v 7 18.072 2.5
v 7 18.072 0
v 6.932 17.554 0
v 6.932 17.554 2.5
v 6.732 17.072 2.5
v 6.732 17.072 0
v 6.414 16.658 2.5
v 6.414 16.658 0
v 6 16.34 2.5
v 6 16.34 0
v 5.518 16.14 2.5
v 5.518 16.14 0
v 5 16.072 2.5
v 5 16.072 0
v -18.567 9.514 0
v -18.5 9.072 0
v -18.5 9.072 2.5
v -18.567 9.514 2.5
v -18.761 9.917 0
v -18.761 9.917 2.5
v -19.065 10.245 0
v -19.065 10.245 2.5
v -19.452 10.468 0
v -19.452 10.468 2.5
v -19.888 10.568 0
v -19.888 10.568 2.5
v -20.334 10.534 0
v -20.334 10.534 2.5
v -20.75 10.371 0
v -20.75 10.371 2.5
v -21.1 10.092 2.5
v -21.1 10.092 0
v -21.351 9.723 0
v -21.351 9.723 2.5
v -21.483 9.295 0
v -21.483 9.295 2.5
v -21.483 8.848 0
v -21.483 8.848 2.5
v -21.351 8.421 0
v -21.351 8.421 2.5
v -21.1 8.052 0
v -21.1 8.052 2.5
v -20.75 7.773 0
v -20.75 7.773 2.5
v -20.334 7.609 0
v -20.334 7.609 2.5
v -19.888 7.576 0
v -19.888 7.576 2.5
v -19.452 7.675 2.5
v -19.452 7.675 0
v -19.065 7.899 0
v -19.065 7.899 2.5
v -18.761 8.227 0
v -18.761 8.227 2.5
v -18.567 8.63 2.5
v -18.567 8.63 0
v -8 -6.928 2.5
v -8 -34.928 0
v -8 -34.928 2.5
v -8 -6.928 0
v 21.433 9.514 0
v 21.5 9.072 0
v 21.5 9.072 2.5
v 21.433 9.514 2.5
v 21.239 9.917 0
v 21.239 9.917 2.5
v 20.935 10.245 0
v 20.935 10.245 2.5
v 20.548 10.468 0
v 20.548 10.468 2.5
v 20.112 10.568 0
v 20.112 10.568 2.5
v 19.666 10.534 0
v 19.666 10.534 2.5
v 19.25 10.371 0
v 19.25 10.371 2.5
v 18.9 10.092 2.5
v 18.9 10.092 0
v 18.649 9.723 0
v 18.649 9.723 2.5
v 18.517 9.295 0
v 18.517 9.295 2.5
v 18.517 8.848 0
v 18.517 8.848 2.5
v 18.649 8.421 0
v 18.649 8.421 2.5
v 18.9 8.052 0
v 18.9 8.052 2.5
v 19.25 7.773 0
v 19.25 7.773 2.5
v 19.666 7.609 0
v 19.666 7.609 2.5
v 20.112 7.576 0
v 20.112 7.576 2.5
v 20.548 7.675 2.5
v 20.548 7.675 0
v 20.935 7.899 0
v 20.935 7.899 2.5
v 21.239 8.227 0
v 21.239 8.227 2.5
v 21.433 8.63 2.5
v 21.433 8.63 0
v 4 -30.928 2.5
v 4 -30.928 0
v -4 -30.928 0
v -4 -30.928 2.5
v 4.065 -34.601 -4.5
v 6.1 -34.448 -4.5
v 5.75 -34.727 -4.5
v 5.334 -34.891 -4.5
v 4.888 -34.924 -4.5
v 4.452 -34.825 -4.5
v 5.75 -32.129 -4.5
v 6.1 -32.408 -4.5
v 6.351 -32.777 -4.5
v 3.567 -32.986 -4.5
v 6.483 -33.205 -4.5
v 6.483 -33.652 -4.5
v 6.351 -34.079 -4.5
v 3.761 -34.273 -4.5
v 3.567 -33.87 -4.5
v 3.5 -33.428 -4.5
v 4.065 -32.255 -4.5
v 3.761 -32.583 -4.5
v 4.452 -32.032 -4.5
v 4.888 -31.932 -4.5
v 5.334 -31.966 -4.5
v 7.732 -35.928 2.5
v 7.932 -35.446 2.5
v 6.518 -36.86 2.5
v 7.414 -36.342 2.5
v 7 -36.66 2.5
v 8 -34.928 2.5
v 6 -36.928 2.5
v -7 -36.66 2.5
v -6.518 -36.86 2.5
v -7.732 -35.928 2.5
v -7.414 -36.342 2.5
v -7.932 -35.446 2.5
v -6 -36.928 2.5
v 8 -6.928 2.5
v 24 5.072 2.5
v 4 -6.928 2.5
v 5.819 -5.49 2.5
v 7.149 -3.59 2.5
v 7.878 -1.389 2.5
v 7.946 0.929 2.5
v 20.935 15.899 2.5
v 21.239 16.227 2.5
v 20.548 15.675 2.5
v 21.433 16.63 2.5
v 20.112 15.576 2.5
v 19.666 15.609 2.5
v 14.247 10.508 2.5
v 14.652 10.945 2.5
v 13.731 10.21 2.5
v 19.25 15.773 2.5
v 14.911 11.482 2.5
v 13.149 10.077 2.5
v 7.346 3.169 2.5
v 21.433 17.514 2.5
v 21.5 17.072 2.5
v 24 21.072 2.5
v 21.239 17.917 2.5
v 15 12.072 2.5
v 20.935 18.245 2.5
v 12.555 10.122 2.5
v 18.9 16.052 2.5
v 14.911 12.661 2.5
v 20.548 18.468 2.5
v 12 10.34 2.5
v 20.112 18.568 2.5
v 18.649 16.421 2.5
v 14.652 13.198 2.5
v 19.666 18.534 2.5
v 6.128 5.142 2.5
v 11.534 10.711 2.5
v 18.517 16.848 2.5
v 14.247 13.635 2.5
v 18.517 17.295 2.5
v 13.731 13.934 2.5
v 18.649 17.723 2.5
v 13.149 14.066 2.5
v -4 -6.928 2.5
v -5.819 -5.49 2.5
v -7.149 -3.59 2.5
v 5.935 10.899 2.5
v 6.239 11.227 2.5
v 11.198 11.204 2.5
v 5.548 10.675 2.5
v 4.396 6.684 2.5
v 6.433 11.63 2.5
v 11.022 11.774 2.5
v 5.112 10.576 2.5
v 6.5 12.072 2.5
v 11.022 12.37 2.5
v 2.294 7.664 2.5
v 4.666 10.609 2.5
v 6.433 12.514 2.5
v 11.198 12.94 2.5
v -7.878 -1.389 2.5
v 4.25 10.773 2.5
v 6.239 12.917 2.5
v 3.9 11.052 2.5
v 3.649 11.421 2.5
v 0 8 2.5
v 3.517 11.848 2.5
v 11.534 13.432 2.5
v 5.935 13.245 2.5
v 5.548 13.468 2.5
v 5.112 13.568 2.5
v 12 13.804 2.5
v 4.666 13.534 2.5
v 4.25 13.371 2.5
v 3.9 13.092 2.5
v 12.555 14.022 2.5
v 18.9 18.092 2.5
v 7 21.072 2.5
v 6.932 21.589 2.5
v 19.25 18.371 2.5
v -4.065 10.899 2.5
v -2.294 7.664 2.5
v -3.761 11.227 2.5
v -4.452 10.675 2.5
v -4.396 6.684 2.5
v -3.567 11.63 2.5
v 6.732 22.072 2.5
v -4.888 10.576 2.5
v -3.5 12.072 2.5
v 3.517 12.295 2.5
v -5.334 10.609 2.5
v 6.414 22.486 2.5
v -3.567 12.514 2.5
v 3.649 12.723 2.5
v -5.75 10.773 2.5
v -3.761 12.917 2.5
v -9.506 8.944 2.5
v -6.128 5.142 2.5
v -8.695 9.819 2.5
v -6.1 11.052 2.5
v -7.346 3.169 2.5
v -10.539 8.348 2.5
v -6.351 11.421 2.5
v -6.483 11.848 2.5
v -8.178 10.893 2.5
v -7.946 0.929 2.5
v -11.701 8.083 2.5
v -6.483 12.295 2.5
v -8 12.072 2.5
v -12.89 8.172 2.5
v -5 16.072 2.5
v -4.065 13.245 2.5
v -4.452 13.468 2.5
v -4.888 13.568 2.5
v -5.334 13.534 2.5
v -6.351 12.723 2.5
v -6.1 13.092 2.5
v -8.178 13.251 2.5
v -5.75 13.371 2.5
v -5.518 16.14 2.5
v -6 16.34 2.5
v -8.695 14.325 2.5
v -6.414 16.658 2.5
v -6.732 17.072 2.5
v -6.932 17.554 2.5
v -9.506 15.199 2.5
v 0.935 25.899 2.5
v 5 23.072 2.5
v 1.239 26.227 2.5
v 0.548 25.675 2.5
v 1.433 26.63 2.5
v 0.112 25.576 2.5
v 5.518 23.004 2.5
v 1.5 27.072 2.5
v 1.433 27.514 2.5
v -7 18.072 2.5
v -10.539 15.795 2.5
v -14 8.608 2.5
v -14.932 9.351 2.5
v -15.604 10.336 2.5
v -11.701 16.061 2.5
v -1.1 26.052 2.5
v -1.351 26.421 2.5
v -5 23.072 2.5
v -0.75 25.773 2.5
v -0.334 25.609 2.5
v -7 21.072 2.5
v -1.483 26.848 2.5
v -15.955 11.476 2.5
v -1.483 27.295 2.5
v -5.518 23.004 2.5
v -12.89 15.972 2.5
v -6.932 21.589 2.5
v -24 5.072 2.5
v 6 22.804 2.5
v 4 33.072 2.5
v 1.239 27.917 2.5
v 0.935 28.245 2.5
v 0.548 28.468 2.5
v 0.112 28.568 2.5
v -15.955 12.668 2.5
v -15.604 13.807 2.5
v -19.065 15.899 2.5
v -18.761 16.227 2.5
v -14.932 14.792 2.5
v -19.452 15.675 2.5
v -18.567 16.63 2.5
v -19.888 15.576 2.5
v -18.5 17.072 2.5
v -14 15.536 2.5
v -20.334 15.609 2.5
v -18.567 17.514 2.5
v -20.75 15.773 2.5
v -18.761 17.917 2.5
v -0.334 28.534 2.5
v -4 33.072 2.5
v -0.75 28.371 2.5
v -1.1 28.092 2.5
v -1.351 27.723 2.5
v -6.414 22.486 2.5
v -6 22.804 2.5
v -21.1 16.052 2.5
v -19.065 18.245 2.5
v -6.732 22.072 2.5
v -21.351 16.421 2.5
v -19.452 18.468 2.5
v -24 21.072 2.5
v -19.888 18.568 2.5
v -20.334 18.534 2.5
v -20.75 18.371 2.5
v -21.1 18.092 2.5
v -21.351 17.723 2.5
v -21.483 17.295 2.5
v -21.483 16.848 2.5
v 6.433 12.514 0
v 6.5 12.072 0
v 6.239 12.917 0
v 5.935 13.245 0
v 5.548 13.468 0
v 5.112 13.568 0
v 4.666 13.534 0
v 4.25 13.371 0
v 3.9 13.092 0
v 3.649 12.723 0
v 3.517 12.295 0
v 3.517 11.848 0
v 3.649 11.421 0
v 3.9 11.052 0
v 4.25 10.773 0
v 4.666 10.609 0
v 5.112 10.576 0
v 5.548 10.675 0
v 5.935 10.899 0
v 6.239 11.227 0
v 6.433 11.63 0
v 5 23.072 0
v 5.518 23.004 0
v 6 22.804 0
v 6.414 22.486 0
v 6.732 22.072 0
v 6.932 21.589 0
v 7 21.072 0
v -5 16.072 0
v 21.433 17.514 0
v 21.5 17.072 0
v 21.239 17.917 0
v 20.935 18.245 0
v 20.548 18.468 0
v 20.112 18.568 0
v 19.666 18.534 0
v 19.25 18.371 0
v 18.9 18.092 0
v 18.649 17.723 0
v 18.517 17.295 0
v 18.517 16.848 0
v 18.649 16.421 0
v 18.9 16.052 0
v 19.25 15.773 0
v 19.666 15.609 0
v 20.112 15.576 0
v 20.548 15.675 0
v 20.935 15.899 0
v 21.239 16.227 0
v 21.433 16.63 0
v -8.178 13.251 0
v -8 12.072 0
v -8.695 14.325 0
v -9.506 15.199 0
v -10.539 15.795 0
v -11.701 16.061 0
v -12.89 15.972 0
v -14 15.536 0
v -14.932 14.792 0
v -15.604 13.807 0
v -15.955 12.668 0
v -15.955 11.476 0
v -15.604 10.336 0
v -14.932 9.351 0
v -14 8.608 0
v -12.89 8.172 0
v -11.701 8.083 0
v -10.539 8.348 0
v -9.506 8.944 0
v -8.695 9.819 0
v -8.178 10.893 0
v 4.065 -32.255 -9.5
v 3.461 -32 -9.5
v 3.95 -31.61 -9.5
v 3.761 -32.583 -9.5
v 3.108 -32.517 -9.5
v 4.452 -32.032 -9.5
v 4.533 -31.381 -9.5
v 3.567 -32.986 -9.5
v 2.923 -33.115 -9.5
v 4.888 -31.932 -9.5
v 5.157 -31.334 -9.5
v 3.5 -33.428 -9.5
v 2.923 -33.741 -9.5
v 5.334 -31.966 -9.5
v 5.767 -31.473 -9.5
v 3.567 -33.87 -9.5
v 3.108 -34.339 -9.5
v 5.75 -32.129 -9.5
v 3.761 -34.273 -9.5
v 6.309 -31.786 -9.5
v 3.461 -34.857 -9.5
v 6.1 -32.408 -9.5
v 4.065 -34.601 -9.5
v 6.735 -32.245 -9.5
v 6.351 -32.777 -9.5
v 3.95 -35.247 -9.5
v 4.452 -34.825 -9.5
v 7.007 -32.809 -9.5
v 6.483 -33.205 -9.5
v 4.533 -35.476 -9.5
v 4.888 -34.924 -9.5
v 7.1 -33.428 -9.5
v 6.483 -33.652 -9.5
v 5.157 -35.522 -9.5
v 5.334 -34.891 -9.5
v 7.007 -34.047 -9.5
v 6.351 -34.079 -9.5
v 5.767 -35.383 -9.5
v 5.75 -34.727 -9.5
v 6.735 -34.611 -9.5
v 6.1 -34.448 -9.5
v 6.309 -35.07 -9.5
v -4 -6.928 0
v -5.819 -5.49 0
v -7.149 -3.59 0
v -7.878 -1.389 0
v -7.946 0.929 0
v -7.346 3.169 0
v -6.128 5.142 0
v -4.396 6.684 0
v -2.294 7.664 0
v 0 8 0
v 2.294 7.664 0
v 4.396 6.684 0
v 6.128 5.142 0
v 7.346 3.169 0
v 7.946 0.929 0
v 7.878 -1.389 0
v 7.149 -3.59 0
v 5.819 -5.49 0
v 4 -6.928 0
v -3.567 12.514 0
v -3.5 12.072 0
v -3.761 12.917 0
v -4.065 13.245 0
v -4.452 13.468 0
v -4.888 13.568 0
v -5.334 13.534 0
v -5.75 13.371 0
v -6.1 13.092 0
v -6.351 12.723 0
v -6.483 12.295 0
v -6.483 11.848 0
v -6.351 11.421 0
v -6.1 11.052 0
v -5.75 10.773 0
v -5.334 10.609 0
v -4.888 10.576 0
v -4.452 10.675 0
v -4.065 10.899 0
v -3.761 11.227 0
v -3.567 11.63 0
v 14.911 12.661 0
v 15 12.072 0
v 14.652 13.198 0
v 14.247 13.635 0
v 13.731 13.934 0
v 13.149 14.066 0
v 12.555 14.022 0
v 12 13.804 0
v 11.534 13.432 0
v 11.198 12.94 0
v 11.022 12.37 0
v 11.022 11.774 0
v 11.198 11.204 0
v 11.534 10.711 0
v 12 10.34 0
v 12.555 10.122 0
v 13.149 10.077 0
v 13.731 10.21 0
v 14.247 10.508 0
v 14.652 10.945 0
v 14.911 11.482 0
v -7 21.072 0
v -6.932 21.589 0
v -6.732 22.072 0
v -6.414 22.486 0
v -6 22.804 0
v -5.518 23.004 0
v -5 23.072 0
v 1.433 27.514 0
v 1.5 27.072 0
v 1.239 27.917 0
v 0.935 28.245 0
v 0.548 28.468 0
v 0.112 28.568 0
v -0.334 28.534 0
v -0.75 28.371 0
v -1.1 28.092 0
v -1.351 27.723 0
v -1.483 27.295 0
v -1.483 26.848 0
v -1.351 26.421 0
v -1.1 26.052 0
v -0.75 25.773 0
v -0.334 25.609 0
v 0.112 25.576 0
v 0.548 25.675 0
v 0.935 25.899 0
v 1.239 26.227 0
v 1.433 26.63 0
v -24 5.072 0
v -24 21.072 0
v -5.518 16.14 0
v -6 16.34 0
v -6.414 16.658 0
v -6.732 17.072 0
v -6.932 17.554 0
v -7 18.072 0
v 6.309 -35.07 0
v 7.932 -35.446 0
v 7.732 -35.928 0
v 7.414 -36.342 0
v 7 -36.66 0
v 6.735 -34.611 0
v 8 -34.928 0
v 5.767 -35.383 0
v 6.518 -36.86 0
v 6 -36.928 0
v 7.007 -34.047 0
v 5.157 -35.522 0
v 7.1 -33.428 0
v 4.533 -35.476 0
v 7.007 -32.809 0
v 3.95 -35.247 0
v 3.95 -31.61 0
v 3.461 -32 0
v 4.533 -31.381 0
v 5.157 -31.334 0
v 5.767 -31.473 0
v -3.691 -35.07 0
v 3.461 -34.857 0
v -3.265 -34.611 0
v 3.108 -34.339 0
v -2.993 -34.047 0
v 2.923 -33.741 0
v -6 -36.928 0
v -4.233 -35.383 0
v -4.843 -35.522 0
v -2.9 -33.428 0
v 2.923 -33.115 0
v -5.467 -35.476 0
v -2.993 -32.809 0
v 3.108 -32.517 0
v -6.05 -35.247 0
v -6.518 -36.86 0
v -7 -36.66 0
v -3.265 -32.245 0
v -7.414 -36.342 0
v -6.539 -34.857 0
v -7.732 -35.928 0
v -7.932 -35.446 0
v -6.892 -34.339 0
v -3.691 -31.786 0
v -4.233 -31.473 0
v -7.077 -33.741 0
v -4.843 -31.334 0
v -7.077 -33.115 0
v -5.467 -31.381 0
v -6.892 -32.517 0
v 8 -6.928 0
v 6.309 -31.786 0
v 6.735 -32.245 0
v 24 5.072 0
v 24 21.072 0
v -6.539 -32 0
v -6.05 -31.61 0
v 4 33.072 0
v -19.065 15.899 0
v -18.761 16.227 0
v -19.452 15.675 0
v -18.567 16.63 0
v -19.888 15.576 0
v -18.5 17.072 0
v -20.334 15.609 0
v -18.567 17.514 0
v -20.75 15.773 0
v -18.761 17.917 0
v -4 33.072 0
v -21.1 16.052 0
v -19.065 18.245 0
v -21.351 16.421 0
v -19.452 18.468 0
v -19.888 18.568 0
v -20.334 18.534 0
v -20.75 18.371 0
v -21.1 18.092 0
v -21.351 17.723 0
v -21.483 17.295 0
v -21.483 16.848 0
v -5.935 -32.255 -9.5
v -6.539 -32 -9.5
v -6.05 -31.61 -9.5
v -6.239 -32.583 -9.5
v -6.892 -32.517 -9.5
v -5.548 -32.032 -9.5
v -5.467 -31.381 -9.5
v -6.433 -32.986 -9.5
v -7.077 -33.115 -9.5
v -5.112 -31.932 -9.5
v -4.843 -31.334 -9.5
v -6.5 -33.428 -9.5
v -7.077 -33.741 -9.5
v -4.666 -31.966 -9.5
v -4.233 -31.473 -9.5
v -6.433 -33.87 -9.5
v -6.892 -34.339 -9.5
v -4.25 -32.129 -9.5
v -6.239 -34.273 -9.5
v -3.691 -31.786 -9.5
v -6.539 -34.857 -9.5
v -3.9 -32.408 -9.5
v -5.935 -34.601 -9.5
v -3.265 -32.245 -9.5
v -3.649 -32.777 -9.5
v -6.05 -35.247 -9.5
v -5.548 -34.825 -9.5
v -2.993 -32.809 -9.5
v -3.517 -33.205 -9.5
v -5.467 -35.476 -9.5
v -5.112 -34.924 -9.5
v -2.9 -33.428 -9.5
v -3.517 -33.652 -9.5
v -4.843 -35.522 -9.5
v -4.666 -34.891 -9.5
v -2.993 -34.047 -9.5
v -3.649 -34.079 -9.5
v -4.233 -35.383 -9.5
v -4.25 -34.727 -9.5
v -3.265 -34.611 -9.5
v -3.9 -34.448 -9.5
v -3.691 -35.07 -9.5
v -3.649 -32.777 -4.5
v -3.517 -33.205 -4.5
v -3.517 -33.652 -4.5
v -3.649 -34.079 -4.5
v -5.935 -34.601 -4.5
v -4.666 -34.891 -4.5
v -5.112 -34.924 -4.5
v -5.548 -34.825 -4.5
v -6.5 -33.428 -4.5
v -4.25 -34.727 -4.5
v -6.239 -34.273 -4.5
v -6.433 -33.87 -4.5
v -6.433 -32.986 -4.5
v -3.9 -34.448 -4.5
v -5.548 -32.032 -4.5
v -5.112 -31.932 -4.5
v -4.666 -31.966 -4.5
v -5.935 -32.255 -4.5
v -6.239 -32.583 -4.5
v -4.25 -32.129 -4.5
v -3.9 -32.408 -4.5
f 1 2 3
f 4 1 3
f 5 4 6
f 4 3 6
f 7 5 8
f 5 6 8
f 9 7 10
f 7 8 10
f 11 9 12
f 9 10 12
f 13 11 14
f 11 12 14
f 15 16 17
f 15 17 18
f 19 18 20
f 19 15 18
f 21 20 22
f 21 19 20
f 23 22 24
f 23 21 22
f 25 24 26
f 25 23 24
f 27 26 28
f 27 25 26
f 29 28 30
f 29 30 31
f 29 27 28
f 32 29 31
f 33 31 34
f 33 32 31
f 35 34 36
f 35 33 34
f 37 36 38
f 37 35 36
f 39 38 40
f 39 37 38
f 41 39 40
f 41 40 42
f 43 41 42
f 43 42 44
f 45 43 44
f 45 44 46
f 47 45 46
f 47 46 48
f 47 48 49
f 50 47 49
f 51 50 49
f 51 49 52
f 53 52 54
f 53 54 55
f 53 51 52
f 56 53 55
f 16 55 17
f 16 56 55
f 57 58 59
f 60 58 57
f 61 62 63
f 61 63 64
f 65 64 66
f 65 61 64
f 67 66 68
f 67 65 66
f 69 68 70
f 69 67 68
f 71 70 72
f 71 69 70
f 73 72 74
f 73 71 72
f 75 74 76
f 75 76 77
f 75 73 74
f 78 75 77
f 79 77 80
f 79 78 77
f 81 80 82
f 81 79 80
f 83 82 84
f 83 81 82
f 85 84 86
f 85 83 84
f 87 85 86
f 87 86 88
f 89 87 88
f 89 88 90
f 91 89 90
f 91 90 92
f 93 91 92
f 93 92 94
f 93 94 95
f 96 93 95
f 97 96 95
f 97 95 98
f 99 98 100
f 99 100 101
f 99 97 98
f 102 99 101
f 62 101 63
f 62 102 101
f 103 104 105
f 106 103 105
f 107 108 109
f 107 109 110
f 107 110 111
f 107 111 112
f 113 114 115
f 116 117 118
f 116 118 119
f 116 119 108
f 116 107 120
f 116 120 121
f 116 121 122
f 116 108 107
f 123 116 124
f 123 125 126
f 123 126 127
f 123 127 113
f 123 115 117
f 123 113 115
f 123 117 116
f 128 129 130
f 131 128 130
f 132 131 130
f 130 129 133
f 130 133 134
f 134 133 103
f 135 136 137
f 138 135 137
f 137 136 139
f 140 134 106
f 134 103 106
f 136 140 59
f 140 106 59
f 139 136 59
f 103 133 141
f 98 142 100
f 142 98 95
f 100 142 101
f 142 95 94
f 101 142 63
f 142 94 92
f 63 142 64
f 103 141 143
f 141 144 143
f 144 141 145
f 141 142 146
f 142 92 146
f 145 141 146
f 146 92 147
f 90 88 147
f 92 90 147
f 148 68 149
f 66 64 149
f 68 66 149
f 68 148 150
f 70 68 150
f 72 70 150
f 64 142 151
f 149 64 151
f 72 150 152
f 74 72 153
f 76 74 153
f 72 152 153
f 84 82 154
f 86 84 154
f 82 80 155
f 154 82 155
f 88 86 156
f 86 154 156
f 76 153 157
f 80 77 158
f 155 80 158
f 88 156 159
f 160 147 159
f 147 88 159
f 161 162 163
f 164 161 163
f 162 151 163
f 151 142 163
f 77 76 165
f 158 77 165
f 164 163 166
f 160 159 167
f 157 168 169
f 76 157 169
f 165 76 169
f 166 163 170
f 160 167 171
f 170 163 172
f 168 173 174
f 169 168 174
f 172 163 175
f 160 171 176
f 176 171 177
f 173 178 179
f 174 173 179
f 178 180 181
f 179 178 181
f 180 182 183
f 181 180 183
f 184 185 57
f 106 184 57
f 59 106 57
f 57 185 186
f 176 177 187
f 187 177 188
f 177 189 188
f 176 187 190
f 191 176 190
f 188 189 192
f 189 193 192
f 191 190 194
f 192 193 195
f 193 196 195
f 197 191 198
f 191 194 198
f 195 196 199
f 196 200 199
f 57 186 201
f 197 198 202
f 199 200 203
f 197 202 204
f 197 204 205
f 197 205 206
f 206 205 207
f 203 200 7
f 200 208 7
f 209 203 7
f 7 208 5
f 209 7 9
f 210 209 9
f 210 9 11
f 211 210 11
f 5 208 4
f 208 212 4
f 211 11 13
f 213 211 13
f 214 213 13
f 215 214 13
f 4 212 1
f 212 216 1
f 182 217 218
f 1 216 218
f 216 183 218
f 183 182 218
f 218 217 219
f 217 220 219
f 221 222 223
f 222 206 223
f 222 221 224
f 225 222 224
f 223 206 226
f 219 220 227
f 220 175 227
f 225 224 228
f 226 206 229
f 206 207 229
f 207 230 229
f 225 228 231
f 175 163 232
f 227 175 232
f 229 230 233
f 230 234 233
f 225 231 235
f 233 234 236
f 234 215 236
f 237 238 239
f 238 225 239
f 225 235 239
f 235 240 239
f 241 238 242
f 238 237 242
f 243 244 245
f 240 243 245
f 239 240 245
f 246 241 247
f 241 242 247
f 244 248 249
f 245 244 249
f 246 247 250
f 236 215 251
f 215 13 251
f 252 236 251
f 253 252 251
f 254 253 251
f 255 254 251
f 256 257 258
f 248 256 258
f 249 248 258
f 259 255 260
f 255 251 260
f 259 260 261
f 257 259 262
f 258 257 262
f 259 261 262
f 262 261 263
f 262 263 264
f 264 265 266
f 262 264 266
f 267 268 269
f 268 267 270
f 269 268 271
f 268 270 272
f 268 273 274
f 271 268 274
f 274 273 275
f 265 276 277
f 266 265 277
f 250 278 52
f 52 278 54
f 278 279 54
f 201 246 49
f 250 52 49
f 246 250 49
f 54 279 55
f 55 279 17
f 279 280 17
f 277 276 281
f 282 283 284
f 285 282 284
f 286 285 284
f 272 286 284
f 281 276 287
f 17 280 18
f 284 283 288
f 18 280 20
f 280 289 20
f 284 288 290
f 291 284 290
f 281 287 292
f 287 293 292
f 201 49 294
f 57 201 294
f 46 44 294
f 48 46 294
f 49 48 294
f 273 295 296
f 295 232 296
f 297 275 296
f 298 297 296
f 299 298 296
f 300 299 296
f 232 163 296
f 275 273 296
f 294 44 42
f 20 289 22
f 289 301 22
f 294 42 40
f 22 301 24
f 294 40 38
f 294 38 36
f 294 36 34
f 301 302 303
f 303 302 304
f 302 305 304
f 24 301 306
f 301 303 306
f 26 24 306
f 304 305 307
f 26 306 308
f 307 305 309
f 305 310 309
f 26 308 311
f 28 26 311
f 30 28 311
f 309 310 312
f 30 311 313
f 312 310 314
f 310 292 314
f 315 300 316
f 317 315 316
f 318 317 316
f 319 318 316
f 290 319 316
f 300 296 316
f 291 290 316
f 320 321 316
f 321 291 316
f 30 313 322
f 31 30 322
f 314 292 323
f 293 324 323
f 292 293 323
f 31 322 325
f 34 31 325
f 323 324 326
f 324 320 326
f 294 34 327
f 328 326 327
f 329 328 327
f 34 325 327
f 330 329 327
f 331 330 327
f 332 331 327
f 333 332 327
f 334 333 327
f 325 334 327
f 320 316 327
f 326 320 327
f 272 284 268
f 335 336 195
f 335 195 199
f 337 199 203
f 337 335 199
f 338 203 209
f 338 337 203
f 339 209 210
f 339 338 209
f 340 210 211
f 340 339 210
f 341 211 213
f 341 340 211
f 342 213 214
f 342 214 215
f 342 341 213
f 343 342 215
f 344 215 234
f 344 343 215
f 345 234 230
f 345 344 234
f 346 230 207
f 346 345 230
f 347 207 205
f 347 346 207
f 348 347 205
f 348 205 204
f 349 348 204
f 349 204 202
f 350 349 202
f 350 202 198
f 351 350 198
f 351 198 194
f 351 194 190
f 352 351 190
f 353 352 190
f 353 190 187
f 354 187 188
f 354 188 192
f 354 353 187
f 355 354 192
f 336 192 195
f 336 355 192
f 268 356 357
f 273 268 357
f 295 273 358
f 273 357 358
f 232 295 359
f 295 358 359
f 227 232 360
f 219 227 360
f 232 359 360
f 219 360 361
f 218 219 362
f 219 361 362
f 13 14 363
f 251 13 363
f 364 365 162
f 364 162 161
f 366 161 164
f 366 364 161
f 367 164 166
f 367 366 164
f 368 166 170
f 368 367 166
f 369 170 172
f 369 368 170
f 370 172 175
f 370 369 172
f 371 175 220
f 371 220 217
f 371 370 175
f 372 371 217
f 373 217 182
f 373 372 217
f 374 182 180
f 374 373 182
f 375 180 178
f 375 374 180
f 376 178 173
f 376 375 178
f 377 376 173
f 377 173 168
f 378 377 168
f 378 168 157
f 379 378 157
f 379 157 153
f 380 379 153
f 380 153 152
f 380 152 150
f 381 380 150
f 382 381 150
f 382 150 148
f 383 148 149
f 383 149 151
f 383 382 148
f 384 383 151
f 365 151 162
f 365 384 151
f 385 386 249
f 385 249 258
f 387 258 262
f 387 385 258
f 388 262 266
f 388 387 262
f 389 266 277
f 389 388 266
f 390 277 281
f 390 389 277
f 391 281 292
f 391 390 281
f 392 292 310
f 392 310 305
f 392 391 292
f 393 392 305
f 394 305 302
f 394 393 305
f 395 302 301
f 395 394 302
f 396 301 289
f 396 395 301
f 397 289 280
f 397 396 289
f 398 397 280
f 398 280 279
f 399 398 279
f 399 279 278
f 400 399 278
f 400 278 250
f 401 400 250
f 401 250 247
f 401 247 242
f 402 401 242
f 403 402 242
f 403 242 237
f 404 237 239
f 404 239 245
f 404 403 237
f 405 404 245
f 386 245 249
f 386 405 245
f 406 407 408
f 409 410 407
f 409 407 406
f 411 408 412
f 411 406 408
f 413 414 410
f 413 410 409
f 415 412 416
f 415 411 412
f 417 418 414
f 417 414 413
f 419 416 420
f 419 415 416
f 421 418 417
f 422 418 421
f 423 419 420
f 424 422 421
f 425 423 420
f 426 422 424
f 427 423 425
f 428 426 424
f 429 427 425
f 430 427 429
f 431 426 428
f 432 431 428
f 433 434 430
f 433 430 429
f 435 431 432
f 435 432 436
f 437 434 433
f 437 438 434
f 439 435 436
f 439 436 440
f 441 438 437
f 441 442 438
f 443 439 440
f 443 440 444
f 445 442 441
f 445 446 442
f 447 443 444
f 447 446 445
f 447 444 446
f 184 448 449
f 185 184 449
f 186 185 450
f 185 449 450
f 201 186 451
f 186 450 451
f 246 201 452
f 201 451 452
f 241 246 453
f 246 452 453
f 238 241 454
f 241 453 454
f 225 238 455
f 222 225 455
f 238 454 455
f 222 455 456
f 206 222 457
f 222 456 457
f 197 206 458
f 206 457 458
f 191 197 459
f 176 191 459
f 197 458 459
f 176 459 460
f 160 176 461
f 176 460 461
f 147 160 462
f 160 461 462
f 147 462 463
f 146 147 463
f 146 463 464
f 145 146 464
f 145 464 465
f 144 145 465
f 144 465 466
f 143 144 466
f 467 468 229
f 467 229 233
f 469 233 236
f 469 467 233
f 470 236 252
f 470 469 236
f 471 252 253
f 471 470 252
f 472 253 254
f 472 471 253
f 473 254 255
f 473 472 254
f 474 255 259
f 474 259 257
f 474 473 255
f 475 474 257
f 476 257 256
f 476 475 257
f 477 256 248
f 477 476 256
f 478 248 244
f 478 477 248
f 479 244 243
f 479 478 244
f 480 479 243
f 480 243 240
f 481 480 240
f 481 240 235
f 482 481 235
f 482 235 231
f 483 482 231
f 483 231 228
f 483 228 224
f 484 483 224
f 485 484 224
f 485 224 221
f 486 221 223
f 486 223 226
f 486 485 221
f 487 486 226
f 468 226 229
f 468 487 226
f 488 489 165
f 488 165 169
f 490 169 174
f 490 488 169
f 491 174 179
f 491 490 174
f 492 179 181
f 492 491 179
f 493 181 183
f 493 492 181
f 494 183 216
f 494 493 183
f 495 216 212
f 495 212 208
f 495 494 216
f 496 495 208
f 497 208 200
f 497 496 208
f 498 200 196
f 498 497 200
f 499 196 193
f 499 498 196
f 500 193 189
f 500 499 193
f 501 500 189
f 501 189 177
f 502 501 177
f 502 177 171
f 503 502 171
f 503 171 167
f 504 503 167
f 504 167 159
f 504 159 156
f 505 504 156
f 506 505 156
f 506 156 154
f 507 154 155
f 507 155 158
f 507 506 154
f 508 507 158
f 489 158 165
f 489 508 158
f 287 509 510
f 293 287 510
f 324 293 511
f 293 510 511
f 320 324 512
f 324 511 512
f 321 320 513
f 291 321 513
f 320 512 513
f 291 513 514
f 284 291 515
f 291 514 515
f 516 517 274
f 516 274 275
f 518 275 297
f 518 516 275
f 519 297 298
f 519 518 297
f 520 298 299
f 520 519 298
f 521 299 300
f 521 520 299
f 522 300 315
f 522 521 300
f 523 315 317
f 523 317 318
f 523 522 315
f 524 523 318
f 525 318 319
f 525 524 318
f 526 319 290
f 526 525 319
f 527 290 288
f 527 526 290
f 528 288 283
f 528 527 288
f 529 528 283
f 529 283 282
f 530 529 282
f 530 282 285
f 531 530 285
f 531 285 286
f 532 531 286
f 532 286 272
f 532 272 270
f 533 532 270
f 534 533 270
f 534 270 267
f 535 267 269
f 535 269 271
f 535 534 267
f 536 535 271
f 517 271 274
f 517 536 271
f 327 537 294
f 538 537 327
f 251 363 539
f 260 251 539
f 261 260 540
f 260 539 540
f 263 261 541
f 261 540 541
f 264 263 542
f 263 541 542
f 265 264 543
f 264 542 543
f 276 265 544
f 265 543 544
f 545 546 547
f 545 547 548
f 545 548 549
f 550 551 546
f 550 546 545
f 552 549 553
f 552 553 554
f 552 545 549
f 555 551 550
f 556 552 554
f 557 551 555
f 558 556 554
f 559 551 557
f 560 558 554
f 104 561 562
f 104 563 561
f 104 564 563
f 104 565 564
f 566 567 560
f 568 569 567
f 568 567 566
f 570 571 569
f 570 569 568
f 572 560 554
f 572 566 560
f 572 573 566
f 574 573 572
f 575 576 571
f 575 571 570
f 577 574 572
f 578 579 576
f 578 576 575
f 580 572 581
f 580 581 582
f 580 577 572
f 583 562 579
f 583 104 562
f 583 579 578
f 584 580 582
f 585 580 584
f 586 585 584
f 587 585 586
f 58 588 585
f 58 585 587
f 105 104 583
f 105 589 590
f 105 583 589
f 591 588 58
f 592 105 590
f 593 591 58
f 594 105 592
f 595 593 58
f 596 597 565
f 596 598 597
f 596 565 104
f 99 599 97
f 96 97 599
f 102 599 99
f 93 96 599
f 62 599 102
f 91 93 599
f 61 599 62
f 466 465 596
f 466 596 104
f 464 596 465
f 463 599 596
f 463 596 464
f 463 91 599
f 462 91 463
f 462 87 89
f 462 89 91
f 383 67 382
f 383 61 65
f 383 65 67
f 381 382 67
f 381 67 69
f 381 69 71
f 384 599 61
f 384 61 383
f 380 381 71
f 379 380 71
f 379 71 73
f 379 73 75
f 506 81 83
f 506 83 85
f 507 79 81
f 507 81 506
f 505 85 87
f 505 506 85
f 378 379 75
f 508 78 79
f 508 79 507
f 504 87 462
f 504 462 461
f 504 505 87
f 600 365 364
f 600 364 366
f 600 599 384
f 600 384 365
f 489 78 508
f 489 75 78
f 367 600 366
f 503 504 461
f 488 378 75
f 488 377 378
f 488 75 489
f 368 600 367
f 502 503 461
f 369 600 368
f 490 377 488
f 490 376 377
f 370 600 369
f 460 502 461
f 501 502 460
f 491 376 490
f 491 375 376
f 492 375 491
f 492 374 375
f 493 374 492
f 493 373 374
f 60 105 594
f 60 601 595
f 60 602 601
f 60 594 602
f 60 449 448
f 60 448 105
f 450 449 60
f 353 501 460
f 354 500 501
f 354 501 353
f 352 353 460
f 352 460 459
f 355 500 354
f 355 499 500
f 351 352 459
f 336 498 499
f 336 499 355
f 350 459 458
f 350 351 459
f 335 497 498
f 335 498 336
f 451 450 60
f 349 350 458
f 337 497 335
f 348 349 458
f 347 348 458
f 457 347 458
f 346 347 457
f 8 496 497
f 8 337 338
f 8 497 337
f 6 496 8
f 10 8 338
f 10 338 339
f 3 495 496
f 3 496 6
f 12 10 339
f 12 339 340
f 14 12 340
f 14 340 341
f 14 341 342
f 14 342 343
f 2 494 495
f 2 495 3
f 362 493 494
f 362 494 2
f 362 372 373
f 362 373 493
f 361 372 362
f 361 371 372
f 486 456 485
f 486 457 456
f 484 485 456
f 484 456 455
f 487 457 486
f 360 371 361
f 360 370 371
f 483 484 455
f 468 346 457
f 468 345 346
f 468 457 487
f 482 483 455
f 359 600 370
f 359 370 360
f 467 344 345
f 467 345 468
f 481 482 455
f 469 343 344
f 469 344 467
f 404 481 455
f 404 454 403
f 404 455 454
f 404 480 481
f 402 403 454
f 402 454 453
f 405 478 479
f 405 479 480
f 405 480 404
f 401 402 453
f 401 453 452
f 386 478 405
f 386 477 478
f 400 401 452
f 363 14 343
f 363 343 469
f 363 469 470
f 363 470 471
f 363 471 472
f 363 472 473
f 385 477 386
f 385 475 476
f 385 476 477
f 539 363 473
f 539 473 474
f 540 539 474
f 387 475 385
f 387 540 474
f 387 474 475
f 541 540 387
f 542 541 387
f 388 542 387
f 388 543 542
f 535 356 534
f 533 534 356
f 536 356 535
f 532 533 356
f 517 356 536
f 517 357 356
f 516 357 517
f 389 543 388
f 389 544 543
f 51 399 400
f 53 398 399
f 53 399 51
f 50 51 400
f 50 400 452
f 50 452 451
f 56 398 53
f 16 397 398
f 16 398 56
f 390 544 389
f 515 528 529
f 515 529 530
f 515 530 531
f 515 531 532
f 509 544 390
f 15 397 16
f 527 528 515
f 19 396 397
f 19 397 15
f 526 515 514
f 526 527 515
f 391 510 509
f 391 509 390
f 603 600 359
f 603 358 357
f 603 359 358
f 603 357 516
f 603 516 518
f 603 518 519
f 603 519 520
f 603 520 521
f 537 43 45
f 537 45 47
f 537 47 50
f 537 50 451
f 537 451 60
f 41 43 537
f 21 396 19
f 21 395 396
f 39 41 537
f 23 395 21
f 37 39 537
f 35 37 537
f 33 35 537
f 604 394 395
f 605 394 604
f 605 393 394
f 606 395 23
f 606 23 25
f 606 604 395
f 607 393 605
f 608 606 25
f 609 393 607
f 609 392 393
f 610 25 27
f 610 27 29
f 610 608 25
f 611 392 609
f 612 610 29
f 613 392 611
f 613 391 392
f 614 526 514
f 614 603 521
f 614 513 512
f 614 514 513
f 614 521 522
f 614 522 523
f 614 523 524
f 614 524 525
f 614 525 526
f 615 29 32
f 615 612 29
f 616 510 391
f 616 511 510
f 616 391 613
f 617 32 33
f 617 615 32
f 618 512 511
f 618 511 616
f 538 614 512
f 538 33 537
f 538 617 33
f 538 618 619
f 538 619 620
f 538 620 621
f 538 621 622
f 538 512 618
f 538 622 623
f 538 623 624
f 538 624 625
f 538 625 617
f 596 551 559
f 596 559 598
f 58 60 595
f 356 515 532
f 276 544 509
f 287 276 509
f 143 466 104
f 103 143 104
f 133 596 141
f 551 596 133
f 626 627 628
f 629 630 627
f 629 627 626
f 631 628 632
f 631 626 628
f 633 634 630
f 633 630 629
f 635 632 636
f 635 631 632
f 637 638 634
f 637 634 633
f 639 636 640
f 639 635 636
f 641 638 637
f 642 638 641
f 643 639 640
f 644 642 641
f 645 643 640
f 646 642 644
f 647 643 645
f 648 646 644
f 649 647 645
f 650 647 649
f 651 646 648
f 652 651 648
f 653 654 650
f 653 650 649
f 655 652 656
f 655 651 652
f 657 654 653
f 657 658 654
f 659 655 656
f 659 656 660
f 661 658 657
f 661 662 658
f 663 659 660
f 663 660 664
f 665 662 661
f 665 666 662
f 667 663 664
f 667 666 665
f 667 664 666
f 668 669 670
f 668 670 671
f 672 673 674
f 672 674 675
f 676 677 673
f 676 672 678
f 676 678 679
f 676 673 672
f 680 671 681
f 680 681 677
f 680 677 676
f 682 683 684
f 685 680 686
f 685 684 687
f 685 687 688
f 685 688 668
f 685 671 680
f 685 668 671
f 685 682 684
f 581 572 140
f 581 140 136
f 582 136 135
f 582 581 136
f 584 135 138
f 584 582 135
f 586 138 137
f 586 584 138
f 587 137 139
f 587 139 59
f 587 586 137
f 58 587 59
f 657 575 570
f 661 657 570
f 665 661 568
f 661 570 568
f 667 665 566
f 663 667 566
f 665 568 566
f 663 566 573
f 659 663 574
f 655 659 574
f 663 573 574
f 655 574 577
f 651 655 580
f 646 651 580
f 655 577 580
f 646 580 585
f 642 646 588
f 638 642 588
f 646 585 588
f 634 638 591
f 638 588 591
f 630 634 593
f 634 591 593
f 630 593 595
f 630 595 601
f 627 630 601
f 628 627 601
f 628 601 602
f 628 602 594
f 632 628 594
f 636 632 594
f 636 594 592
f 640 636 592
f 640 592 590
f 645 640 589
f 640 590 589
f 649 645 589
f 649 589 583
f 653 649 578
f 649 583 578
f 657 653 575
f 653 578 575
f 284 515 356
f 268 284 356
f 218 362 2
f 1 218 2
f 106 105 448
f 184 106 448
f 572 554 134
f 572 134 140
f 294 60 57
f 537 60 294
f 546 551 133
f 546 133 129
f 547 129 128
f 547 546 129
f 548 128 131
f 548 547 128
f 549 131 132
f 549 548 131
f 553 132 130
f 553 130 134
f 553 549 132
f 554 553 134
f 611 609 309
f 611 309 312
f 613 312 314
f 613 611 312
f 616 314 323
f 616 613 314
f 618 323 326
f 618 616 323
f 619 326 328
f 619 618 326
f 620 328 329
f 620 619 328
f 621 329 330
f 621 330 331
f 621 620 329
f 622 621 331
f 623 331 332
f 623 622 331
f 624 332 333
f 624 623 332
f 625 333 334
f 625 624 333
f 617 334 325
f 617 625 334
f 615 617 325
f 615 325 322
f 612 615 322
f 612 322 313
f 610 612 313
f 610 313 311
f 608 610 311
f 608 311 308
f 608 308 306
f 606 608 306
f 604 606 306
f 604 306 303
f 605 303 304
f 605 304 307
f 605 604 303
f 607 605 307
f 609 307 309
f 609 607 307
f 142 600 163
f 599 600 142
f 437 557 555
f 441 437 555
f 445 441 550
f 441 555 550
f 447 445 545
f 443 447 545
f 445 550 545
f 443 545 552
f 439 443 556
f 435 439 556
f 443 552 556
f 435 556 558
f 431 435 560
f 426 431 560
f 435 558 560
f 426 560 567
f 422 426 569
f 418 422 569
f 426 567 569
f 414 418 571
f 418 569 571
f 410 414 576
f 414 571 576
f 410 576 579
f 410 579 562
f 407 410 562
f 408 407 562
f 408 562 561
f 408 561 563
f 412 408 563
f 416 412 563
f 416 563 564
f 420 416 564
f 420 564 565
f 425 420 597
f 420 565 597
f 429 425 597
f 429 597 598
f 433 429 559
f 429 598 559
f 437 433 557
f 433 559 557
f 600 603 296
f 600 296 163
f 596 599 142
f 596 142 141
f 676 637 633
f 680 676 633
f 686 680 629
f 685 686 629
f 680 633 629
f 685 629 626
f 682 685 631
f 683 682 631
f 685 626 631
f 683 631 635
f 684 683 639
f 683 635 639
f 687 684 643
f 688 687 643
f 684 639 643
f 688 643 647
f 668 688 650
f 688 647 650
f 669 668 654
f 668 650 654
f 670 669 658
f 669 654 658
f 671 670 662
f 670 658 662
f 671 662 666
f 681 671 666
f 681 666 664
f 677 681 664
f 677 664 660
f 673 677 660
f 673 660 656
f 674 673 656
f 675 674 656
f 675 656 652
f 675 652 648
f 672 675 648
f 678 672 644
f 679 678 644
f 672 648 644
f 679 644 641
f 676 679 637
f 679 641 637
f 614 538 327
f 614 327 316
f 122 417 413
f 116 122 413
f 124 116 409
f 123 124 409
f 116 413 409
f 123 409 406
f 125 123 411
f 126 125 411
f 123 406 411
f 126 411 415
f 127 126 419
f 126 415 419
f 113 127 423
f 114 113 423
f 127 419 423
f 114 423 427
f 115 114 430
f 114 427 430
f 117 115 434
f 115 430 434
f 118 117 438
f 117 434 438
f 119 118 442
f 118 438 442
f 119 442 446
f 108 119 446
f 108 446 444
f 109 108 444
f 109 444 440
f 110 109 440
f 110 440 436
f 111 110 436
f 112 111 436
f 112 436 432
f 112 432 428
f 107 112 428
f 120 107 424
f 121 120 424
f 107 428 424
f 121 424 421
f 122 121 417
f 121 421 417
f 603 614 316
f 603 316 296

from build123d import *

# Parameters (mm, degrees)
SKETCH1_R           = 4
SKETCH1_R_2         = 1.5
SKETCH1_R_3         = 2
BOSS_EXTRUDE1_DEPTH = 2.5
SKETCH2_R           = 2.1
BOSS_EXTRUDE2_DEPTH = 9.5
SKETCH4_R           = 1.5
CUT_EXTRUDE1_DEPTH  = 5


with BuildPart() as part:
    # Sketch1 → Boss-Extrude1 (new body)
    with BuildSketch(Plane.XY):
        with BuildLine():
            Line((-24, 5.07179677), (-24, 21.07179677))
            Line((-24, 21.07179677), (-4, 33.07179677))
            Line((-4, 33.07179677), (4, 33.07179677))
            Line((4, 33.07179677), (24, 21.07179677))
            Line((24, 21.07179677), (24, 5.07179677))
            Line((24, 5.07179677), (8, -6.92820323))
            Line((8, -6.92820323), (8, -34.92820323))
            ThreePointArc((8, -34.92820323), (7.414213562, -36.342416793), (6, -36.92820323))
            Line((6, -36.92820323), (-6, -36.92820323))
            ThreePointArc((-6, -36.92820323), (-7.414213562, -36.342416793), (-8, -34.92820323))
            Line((-8, -34.92820323), (-8, -6.92820323))
            Line((-8, -6.92820323), (-24, 5.07179677))
        make_face()
        with Locations((-12, 12.07179677)):
            Circle(SKETCH1_R, mode=Mode.SUBTRACT)
        with Locations((-5, 12.07179677)):
            Circle(SKETCH1_R_2, mode=Mode.SUBTRACT)
        with Locations((5, 12.07179677)):
            Circle(SKETCH1_R_2, mode=Mode.SUBTRACT)
        with Locations((0, 27.07179677)):
            Circle(SKETCH1_R_2, mode=Mode.SUBTRACT)
        with Locations((20, 17.07179677)):
            Circle(SKETCH1_R_2, mode=Mode.SUBTRACT)
        with Locations((20, 9.07179677)):
            Circle(SKETCH1_R_2, mode=Mode.SUBTRACT)
        with Locations((-20, 17.07179677)):
            Circle(SKETCH1_R_2, mode=Mode.SUBTRACT)
        with Locations((-20, 9.07179677)):
            Circle(SKETCH1_R_2, mode=Mode.SUBTRACT)
        with Locations((13, 12.07179677)):
            Circle(SKETCH1_R_3, mode=Mode.SUBTRACT)
        with BuildLine():
            Line((4, -30.92820323), (-4, -30.92820323))
            Line((-4, -30.92820323), (-4, -6.92820323))
            ThreePointArc((-4, -6.92820323), (0, 8), (4, -6.92820323))
            Line((4, -6.92820323), (4, -30.92820323))
        make_face(mode=Mode.SUBTRACT)
        with BuildLine():
            Line((-5, 23.07179677), (5, 23.07179677))
            ThreePointArc((5, 23.07179677), (6.414213562, 22.486010332), (7, 21.07179677))
            Line((7, 21.07179677), (7, 18.07179677))
            ThreePointArc((7, 18.07179677), (6.414213562, 16.657583207), (5, 16.07179677))
            Line((5, 16.07179677), (-5, 16.07179677))
            ThreePointArc((-5, 16.07179677), (-6.414213562, 16.657583207), (-7, 18.07179677))
            Line((-7, 18.07179677), (-7, 21.07179677))
            ThreePointArc((-7, 21.07179677), (-6.414213562, 22.486010332), (-5, 23.07179677))
        make_face(mode=Mode.SUBTRACT)
    extrude(amount=BOSS_EXTRUDE1_DEPTH)

    # Sketch2 → Boss-Extrude2 (add)
    with BuildSketch(Plane(origin=(0, 0, 0), x_dir=(-1, 0, 0), z_dir=(0, 0, -1))):
        with Locations(Location((-5, -33.42820323, 0), (0, 0, 180))):
            Circle(SKETCH2_R)
        with Locations(Location((5, -33.42820323, 0), (0, 0, 180))):
            Circle(SKETCH2_R)
    extrude(amount=BOSS_EXTRUDE2_DEPTH)

    # Sketch4 → Cut-Extrude1 (cut)
    with BuildSketch(Plane(origin=(0, 0, -9.5), x_dir=(-1, 0, 0), z_dir=(0, 0, -1))):
        with Locations((-5, -33.42820323)):
            Circle(SKETCH4_R)
        with Locations((5, -33.42820323)):
            Circle(SKETCH4_R)
    extrude(amount=-CUT_EXTRUDE1_DEPTH, mode=Mode.SUBTRACT)


solid = part.part
